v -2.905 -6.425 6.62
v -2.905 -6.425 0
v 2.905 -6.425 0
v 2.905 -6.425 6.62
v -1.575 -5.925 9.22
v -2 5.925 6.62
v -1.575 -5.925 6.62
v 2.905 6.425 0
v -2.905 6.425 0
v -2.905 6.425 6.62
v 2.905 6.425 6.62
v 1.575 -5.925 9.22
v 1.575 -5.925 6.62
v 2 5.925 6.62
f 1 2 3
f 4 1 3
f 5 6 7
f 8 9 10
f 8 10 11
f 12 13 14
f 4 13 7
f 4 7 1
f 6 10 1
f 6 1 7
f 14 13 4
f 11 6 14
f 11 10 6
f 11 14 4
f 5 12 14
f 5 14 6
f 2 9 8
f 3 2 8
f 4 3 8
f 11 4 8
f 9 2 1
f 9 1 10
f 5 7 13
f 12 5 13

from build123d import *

# Parameters (mm, degrees)
F2_W     = 5.81
F2_H     = 12.85
F3_DEPTH = 6.62
F6_DEPTH = 2.6
F7_SIZE2 = 11.84999
F7_SIZE  = 2.59999


# Not quite as in the source:
# - a fillet or chamfer is up to 0.001 mm smaller than in the source, because OpenCascade refuses the exact size


with BuildPart() as f3:
    # F2 (on Top) → F3 (new body)
    with BuildSketch(Plane.XY):
        Rectangle(F2_W, F2_H)
    extrude(amount=F3_DEPTH)

    # F4 (on face) → F6 (join)
    with BuildSketch(Plane.XY.offset(6.62)):
        Polygon((2, 5.925), (-2, 5.925), (-1.575, -5.925), (1.575, -5.925), align=None)
    extrude(amount=F6_DEPTH)

    # F7 (size 2.6 and 11.85 in the source; OpenCascade refuses exactly that, so slightly less here)
    f7_edges = [f3.edges().sort_by_distance(p)[0] for p in [
        (0, 5.925, 9.22),
    ]]
    f7_side = f3.faces().sort_by_distance((0, 5.925, 7.92))[0]
    chamfer(f7_edges, length=F7_SIZE, length2=F7_SIZE2, reference=f7_side)


solid = f3.part
